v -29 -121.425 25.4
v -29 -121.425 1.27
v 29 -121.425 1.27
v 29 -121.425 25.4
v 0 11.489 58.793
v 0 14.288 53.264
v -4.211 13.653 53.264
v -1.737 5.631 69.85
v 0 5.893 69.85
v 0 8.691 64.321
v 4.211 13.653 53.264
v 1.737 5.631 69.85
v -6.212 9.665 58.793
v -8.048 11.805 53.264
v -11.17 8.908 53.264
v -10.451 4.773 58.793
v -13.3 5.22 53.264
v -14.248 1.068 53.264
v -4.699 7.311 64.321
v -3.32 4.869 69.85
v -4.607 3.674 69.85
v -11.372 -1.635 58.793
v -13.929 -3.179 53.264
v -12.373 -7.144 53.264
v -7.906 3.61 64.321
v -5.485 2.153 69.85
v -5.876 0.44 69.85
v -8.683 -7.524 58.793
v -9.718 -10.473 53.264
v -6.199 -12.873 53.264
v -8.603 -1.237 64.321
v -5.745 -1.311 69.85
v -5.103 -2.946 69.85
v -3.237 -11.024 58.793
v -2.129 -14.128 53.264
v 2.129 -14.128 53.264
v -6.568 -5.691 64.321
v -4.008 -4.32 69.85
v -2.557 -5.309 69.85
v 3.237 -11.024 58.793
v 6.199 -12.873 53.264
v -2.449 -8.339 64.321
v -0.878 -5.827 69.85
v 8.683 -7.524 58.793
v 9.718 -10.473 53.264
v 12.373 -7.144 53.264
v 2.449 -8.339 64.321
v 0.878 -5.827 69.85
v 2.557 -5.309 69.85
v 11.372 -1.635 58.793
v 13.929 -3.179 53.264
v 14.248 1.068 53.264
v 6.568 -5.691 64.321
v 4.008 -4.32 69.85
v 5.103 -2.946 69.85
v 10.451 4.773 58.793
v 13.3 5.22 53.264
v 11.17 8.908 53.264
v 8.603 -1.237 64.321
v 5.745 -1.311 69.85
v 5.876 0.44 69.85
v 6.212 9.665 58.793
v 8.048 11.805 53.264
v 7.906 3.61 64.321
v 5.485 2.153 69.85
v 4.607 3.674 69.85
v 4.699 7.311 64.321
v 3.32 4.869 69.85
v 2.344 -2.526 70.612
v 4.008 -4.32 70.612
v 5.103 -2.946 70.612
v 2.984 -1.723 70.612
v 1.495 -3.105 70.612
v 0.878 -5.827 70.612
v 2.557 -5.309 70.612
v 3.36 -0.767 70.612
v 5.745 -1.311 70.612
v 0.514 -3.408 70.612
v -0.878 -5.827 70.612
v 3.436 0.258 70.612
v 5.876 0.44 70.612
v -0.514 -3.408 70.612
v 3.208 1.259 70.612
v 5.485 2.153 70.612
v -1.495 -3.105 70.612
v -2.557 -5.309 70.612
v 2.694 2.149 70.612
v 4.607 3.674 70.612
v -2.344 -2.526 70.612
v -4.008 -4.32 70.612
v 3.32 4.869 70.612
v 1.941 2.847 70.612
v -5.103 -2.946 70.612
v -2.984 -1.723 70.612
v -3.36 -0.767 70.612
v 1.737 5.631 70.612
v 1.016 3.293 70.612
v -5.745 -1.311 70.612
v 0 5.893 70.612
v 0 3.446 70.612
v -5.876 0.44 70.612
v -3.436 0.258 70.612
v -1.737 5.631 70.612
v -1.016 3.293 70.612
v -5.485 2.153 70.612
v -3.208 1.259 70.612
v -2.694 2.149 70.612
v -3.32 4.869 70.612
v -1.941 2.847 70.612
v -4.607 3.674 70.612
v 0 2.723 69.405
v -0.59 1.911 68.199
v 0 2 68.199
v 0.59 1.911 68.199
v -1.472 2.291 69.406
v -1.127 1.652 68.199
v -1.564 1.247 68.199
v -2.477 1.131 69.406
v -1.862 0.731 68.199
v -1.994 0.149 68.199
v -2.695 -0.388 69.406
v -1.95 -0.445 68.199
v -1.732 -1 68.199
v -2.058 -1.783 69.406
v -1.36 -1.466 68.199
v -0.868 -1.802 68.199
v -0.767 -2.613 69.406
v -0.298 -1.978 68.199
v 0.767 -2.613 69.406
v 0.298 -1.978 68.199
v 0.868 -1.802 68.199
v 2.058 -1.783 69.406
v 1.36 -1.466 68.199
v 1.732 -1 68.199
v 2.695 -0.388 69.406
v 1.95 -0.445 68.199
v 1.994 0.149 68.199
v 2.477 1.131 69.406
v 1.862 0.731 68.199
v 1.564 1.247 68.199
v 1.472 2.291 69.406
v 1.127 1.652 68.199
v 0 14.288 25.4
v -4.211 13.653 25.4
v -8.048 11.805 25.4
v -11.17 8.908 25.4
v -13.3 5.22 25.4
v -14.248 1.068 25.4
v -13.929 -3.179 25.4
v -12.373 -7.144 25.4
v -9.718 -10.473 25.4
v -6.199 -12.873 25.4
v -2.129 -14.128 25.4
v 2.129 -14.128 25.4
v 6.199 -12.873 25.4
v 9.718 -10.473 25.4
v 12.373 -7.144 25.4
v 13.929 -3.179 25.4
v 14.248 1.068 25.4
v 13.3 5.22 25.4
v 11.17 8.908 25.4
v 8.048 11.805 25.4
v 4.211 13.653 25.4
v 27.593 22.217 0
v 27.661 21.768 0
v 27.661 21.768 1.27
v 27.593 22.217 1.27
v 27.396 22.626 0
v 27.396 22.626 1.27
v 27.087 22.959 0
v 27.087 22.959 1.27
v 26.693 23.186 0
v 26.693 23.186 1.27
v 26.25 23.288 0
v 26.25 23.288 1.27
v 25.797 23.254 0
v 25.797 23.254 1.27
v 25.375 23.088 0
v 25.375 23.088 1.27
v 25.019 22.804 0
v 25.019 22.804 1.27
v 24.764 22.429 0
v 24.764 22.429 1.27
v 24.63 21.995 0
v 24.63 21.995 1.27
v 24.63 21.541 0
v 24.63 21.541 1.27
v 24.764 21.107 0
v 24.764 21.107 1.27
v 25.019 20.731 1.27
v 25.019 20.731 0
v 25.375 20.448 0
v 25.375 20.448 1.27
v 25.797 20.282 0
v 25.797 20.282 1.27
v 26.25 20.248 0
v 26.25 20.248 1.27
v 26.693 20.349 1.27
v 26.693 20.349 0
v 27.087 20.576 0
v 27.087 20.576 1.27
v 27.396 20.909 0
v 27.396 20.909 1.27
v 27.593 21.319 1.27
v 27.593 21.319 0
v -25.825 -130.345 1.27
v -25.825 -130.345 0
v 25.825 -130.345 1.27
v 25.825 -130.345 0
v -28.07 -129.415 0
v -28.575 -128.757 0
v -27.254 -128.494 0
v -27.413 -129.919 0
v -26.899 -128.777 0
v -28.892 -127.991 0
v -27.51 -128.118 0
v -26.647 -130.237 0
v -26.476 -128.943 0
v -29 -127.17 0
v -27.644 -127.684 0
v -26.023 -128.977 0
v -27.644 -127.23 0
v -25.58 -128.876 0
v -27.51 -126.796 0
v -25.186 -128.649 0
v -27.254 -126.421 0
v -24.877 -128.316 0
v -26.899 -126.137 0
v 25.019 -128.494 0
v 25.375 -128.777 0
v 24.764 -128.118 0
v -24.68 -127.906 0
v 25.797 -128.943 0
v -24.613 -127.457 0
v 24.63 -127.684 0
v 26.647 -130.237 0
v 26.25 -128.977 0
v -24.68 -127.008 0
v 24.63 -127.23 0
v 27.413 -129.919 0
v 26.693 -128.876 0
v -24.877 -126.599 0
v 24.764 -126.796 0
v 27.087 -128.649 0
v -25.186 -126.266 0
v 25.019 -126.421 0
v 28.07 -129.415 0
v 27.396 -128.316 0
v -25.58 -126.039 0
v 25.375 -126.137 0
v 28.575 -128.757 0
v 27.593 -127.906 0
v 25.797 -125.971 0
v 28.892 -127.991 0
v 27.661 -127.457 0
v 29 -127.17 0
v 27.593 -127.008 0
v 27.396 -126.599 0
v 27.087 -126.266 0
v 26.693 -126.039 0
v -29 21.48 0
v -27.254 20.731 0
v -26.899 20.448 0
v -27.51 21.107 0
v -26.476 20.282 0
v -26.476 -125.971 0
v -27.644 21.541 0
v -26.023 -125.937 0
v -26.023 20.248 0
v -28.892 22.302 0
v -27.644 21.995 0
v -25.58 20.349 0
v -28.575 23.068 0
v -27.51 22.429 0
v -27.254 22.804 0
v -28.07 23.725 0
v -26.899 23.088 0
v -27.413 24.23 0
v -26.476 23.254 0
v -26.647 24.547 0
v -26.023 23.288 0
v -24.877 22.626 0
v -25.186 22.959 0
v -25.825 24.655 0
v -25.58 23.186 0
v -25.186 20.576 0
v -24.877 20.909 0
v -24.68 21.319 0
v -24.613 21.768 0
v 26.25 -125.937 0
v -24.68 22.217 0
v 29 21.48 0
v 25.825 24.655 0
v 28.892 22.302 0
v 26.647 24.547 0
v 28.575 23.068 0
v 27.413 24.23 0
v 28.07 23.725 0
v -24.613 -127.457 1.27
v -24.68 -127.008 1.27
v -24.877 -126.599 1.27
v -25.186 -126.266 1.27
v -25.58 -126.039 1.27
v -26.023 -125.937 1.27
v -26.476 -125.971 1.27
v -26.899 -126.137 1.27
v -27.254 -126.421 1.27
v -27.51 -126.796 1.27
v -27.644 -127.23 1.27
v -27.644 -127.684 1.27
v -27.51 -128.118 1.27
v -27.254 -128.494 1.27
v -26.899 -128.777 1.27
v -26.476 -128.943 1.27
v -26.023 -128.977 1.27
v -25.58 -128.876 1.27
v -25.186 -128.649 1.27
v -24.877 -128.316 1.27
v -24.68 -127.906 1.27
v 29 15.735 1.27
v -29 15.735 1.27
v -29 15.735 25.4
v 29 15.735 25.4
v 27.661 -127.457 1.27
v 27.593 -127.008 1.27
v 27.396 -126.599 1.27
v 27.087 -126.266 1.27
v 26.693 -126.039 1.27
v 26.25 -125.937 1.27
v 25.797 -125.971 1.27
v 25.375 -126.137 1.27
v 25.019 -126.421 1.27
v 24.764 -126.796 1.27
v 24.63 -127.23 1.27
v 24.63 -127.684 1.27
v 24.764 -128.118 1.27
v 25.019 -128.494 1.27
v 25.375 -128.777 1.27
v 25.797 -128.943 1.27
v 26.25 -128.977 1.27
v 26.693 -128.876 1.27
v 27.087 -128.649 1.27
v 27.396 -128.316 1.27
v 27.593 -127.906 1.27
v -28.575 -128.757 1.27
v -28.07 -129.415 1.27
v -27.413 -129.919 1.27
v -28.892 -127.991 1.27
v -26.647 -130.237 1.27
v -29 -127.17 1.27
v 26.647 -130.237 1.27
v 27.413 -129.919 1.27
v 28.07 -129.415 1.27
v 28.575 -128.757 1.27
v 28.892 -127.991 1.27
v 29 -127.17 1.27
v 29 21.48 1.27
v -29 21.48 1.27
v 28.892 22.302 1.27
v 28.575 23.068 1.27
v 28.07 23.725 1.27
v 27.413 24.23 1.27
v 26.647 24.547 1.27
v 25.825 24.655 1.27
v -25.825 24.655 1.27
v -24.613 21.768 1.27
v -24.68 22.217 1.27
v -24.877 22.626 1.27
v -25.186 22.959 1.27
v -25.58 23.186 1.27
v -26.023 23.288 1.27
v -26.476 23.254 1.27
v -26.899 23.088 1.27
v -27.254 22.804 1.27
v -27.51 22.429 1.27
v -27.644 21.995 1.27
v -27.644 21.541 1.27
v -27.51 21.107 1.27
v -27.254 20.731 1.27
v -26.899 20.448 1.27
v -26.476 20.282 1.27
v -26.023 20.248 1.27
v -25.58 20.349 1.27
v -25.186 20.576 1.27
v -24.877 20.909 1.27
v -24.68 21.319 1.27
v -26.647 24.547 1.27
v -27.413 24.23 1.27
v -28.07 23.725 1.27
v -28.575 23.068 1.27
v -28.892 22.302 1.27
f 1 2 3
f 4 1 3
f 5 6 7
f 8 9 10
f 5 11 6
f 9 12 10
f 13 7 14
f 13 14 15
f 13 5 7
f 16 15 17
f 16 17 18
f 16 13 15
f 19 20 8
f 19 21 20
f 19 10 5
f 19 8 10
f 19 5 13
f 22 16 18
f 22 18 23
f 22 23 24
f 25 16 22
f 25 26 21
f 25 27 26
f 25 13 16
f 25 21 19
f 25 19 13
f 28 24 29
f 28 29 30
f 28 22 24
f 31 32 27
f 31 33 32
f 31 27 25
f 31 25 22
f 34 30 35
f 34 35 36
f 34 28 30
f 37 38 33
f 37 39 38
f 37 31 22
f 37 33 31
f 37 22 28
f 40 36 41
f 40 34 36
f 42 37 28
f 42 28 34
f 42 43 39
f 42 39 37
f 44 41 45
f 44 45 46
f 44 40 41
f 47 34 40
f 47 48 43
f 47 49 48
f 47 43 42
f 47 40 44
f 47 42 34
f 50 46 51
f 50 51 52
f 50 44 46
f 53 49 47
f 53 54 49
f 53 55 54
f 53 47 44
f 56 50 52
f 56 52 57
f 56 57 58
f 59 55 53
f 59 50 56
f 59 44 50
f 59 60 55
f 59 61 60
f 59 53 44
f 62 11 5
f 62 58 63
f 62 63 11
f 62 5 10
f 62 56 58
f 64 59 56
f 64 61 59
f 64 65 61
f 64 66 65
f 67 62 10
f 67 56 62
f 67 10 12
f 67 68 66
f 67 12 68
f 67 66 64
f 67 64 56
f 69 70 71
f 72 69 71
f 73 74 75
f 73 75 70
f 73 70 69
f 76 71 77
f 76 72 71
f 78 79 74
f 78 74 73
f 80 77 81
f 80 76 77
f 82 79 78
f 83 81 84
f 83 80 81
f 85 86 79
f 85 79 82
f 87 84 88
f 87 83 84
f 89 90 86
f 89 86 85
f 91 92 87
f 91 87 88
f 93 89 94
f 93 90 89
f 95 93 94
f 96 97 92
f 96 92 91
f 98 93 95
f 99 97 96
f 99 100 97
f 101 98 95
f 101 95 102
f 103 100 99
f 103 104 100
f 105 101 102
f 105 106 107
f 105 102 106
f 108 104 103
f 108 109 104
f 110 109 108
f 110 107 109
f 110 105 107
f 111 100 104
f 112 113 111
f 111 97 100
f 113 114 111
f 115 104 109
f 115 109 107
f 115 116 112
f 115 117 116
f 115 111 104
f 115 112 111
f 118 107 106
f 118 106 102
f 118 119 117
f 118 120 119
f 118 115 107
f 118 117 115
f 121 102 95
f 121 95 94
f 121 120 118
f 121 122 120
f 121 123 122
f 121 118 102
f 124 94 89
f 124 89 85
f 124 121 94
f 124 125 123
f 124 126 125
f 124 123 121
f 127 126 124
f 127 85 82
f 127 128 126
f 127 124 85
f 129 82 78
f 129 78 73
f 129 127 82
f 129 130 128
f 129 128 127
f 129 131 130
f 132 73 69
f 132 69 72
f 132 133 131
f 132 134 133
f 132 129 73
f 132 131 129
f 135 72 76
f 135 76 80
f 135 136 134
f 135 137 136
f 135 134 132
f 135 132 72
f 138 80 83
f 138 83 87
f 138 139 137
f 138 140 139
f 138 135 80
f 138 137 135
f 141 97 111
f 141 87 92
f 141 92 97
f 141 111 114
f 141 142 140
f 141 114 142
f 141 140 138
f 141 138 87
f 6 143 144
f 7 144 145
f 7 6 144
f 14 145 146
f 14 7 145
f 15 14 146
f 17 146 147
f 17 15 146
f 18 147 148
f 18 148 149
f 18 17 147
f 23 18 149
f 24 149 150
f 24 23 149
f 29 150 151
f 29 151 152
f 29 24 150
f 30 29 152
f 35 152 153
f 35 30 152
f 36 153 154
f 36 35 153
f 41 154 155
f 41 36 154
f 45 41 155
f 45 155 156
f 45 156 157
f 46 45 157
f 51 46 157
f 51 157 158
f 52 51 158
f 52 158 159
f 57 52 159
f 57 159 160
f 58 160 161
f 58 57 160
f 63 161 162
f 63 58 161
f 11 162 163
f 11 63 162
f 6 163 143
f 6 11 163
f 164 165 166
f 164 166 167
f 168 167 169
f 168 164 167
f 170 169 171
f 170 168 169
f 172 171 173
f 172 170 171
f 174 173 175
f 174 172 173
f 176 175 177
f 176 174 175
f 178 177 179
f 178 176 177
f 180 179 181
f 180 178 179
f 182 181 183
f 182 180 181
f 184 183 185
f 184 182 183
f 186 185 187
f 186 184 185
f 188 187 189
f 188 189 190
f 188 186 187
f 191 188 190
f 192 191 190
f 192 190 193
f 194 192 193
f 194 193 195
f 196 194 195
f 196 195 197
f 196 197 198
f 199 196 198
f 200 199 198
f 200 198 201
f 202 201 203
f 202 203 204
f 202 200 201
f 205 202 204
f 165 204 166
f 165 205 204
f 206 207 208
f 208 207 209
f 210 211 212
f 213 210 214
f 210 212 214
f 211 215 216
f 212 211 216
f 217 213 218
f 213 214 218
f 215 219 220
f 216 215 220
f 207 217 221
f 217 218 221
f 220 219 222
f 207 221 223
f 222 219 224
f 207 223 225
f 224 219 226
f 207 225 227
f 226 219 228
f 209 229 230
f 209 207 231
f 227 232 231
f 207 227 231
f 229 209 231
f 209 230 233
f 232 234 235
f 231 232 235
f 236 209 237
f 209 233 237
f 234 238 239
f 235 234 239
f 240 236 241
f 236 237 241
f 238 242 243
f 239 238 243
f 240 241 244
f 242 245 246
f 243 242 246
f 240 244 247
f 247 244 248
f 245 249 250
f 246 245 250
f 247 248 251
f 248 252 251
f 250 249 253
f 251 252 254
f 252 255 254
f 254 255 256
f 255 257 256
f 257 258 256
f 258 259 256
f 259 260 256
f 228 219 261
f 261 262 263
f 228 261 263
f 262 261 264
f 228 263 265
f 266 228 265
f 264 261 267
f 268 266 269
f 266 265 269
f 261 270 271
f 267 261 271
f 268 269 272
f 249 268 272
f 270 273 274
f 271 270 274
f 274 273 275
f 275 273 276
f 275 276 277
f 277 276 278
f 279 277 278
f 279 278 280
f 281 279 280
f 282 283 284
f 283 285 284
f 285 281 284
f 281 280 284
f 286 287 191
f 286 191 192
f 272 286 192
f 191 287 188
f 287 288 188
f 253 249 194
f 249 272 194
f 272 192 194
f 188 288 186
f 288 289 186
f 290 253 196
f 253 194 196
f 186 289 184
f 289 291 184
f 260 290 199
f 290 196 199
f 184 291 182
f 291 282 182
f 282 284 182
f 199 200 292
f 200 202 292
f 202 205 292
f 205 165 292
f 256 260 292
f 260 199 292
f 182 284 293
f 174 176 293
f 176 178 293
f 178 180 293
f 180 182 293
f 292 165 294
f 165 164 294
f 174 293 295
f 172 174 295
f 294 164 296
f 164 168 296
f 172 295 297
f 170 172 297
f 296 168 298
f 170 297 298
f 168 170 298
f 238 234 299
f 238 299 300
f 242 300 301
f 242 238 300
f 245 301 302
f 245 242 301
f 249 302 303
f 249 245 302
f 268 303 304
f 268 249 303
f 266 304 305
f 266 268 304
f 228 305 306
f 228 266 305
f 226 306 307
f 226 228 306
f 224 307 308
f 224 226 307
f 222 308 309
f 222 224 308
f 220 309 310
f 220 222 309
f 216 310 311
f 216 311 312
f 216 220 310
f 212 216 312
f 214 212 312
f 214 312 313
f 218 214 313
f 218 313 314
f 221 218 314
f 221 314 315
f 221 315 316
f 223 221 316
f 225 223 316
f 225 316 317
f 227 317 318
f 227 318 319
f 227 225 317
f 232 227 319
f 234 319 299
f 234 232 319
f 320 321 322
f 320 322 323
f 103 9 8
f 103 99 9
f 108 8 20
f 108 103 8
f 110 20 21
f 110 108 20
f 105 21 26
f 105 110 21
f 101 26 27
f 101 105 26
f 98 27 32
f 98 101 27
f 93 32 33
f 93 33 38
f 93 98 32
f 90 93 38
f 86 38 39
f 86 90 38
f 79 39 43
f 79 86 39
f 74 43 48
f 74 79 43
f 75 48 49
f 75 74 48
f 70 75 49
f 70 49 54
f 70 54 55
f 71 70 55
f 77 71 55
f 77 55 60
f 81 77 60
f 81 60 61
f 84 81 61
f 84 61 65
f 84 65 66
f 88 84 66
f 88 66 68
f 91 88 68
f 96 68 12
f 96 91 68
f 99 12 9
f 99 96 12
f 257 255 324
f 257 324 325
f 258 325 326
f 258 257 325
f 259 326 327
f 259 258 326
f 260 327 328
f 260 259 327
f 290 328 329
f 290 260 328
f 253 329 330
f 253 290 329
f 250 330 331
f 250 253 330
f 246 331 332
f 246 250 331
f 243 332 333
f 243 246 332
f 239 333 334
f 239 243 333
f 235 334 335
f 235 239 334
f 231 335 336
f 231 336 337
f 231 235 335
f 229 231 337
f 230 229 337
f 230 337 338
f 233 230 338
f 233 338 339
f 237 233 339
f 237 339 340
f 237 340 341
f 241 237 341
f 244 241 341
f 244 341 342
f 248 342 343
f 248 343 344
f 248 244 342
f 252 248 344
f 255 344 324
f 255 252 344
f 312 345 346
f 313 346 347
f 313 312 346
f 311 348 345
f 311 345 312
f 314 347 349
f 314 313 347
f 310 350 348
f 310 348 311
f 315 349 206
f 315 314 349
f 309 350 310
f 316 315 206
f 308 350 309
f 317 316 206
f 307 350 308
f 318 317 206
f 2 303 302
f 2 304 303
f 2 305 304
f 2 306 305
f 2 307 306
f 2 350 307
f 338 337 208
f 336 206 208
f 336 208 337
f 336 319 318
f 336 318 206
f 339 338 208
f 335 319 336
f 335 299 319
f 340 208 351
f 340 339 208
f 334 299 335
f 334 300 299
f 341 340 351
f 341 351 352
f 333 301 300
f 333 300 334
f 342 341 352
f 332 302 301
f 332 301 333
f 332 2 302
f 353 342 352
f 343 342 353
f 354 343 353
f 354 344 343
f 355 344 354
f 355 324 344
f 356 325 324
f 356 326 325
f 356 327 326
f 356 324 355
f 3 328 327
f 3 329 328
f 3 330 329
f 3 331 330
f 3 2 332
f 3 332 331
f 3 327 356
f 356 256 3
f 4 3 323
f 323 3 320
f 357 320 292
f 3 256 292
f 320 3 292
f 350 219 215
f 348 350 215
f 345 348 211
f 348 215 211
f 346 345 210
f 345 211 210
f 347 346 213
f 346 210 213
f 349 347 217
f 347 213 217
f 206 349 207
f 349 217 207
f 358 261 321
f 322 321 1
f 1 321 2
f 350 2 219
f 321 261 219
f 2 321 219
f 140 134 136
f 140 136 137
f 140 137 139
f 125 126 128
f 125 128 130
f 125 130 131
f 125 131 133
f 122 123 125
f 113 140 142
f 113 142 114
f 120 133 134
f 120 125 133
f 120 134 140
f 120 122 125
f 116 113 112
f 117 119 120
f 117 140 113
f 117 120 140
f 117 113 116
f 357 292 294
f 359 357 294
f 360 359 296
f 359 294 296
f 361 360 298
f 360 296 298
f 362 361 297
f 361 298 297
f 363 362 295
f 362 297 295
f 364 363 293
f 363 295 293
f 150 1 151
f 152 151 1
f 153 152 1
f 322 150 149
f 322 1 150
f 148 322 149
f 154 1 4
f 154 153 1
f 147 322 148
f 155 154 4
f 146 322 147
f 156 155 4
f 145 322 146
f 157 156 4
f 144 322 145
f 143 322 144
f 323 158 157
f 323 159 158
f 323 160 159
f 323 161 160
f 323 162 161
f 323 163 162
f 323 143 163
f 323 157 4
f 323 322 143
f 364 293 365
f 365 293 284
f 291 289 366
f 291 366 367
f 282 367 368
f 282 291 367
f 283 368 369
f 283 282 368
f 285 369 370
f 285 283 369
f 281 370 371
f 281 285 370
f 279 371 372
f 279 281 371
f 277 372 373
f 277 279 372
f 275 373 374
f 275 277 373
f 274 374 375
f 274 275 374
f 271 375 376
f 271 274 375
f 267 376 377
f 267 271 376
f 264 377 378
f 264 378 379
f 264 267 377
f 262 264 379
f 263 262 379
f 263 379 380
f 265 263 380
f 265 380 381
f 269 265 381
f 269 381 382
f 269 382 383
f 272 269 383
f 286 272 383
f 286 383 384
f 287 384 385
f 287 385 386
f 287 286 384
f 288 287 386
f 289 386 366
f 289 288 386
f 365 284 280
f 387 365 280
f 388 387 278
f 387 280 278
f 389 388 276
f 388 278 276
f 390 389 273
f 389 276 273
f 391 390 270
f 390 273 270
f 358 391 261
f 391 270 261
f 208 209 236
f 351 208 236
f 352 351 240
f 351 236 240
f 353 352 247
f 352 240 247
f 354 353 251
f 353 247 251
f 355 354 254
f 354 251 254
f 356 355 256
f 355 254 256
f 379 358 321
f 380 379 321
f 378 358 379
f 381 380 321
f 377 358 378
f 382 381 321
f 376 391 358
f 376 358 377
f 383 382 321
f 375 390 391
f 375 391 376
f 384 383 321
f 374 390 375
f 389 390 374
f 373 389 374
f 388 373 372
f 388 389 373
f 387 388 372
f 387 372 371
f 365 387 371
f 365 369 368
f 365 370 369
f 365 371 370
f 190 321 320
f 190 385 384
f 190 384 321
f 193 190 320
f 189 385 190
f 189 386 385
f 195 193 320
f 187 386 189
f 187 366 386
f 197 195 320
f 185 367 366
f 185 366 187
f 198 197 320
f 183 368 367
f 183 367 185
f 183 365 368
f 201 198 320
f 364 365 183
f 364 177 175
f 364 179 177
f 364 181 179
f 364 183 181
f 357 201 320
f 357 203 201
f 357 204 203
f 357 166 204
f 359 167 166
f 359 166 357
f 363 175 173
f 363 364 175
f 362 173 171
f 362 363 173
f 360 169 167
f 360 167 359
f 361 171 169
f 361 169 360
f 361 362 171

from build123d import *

# Parameters (mm, degrees)
F0_W     = 58
F0_H     = 137.16
F0_R     = 1.524
F1_DEPTH = 1.27
F2_START = 1.27
F2_DEPTH = 24.13


with BuildPart() as f1:
    # F0 (on Top) → F1 (new body)
    with BuildSketch(Plane.XY):
        with Locations((0, -52.8447)):
            Rectangle(F0_W, F0_H)
        with BuildLine():
            Line((-29, 15.7353), (29, 15.7353))
            Line((29, 15.7353), (29, 21.4803))
            ThreePointArc((29, 21.4803), (28.0700640303, 23.7253640303), (25.825, 24.6553))
            Line((25.825, 24.6553), (-25.825, 24.6553))
            ThreePointArc((-25.825, 24.6553), (-28.0700640303, 23.7253640303), (-29, 21.4803))
            Line((-29, 21.4803), (-29, 15.7353))
        make_face()
        with Locations((-26.1366, 21.7678)):
            Circle(F0_R, mode=Mode.SUBTRACT)
        with Locations((26.1366, 21.7678)):
            Circle(F0_R, mode=Mode.SUBTRACT)
        with BuildLine():
            Line((-25.825, -130.3447), (25.825, -130.3447))
            ThreePointArc((25.825, -130.3447), (28.0700640303, -129.4147640303), (29, -127.1697))
            Line((29, -127.1697), (29, -121.4247))
            Line((29, -121.4247), (-29, -121.4247))
            Line((-29, -121.4247), (-29, -127.1697))
            ThreePointArc((-29, -127.1697), (-28.0700640303, -129.4147640303), (-25.825, -130.3447))
        make_face()
        with Locations((-26.1366, -127.4572)):
            Circle(F0_R, mode=Mode.SUBTRACT)
        with Locations((26.1366, -127.4572)):
            Circle(F0_R, mode=Mode.SUBTRACT)
    extrude(amount=F1_DEPTH)

    # F0 (on Top) → F2 (join)
    with BuildSketch(Plane.XY.offset(F2_START)):
        with Locations((0, -52.8447)):
            Rectangle(F0_W, F0_H)
    extrude(amount=F2_DEPTH)

    # F3 (on Right) → F4 (revolve)
    with BuildSketch(Plane.YZ):
        Polygon((5.8928, 70.612), (3.4461211403, 70.612), (2, 68.199), (0, 68.199), (0, 25.4), (14.2875, 25.4), (14.2875, 53.2638), (5.8928, 69.85), align=None)
    revolve(axis=Axis((0, 0, 43.7137000263), (0, 0, 1)))


solid = f1.part
